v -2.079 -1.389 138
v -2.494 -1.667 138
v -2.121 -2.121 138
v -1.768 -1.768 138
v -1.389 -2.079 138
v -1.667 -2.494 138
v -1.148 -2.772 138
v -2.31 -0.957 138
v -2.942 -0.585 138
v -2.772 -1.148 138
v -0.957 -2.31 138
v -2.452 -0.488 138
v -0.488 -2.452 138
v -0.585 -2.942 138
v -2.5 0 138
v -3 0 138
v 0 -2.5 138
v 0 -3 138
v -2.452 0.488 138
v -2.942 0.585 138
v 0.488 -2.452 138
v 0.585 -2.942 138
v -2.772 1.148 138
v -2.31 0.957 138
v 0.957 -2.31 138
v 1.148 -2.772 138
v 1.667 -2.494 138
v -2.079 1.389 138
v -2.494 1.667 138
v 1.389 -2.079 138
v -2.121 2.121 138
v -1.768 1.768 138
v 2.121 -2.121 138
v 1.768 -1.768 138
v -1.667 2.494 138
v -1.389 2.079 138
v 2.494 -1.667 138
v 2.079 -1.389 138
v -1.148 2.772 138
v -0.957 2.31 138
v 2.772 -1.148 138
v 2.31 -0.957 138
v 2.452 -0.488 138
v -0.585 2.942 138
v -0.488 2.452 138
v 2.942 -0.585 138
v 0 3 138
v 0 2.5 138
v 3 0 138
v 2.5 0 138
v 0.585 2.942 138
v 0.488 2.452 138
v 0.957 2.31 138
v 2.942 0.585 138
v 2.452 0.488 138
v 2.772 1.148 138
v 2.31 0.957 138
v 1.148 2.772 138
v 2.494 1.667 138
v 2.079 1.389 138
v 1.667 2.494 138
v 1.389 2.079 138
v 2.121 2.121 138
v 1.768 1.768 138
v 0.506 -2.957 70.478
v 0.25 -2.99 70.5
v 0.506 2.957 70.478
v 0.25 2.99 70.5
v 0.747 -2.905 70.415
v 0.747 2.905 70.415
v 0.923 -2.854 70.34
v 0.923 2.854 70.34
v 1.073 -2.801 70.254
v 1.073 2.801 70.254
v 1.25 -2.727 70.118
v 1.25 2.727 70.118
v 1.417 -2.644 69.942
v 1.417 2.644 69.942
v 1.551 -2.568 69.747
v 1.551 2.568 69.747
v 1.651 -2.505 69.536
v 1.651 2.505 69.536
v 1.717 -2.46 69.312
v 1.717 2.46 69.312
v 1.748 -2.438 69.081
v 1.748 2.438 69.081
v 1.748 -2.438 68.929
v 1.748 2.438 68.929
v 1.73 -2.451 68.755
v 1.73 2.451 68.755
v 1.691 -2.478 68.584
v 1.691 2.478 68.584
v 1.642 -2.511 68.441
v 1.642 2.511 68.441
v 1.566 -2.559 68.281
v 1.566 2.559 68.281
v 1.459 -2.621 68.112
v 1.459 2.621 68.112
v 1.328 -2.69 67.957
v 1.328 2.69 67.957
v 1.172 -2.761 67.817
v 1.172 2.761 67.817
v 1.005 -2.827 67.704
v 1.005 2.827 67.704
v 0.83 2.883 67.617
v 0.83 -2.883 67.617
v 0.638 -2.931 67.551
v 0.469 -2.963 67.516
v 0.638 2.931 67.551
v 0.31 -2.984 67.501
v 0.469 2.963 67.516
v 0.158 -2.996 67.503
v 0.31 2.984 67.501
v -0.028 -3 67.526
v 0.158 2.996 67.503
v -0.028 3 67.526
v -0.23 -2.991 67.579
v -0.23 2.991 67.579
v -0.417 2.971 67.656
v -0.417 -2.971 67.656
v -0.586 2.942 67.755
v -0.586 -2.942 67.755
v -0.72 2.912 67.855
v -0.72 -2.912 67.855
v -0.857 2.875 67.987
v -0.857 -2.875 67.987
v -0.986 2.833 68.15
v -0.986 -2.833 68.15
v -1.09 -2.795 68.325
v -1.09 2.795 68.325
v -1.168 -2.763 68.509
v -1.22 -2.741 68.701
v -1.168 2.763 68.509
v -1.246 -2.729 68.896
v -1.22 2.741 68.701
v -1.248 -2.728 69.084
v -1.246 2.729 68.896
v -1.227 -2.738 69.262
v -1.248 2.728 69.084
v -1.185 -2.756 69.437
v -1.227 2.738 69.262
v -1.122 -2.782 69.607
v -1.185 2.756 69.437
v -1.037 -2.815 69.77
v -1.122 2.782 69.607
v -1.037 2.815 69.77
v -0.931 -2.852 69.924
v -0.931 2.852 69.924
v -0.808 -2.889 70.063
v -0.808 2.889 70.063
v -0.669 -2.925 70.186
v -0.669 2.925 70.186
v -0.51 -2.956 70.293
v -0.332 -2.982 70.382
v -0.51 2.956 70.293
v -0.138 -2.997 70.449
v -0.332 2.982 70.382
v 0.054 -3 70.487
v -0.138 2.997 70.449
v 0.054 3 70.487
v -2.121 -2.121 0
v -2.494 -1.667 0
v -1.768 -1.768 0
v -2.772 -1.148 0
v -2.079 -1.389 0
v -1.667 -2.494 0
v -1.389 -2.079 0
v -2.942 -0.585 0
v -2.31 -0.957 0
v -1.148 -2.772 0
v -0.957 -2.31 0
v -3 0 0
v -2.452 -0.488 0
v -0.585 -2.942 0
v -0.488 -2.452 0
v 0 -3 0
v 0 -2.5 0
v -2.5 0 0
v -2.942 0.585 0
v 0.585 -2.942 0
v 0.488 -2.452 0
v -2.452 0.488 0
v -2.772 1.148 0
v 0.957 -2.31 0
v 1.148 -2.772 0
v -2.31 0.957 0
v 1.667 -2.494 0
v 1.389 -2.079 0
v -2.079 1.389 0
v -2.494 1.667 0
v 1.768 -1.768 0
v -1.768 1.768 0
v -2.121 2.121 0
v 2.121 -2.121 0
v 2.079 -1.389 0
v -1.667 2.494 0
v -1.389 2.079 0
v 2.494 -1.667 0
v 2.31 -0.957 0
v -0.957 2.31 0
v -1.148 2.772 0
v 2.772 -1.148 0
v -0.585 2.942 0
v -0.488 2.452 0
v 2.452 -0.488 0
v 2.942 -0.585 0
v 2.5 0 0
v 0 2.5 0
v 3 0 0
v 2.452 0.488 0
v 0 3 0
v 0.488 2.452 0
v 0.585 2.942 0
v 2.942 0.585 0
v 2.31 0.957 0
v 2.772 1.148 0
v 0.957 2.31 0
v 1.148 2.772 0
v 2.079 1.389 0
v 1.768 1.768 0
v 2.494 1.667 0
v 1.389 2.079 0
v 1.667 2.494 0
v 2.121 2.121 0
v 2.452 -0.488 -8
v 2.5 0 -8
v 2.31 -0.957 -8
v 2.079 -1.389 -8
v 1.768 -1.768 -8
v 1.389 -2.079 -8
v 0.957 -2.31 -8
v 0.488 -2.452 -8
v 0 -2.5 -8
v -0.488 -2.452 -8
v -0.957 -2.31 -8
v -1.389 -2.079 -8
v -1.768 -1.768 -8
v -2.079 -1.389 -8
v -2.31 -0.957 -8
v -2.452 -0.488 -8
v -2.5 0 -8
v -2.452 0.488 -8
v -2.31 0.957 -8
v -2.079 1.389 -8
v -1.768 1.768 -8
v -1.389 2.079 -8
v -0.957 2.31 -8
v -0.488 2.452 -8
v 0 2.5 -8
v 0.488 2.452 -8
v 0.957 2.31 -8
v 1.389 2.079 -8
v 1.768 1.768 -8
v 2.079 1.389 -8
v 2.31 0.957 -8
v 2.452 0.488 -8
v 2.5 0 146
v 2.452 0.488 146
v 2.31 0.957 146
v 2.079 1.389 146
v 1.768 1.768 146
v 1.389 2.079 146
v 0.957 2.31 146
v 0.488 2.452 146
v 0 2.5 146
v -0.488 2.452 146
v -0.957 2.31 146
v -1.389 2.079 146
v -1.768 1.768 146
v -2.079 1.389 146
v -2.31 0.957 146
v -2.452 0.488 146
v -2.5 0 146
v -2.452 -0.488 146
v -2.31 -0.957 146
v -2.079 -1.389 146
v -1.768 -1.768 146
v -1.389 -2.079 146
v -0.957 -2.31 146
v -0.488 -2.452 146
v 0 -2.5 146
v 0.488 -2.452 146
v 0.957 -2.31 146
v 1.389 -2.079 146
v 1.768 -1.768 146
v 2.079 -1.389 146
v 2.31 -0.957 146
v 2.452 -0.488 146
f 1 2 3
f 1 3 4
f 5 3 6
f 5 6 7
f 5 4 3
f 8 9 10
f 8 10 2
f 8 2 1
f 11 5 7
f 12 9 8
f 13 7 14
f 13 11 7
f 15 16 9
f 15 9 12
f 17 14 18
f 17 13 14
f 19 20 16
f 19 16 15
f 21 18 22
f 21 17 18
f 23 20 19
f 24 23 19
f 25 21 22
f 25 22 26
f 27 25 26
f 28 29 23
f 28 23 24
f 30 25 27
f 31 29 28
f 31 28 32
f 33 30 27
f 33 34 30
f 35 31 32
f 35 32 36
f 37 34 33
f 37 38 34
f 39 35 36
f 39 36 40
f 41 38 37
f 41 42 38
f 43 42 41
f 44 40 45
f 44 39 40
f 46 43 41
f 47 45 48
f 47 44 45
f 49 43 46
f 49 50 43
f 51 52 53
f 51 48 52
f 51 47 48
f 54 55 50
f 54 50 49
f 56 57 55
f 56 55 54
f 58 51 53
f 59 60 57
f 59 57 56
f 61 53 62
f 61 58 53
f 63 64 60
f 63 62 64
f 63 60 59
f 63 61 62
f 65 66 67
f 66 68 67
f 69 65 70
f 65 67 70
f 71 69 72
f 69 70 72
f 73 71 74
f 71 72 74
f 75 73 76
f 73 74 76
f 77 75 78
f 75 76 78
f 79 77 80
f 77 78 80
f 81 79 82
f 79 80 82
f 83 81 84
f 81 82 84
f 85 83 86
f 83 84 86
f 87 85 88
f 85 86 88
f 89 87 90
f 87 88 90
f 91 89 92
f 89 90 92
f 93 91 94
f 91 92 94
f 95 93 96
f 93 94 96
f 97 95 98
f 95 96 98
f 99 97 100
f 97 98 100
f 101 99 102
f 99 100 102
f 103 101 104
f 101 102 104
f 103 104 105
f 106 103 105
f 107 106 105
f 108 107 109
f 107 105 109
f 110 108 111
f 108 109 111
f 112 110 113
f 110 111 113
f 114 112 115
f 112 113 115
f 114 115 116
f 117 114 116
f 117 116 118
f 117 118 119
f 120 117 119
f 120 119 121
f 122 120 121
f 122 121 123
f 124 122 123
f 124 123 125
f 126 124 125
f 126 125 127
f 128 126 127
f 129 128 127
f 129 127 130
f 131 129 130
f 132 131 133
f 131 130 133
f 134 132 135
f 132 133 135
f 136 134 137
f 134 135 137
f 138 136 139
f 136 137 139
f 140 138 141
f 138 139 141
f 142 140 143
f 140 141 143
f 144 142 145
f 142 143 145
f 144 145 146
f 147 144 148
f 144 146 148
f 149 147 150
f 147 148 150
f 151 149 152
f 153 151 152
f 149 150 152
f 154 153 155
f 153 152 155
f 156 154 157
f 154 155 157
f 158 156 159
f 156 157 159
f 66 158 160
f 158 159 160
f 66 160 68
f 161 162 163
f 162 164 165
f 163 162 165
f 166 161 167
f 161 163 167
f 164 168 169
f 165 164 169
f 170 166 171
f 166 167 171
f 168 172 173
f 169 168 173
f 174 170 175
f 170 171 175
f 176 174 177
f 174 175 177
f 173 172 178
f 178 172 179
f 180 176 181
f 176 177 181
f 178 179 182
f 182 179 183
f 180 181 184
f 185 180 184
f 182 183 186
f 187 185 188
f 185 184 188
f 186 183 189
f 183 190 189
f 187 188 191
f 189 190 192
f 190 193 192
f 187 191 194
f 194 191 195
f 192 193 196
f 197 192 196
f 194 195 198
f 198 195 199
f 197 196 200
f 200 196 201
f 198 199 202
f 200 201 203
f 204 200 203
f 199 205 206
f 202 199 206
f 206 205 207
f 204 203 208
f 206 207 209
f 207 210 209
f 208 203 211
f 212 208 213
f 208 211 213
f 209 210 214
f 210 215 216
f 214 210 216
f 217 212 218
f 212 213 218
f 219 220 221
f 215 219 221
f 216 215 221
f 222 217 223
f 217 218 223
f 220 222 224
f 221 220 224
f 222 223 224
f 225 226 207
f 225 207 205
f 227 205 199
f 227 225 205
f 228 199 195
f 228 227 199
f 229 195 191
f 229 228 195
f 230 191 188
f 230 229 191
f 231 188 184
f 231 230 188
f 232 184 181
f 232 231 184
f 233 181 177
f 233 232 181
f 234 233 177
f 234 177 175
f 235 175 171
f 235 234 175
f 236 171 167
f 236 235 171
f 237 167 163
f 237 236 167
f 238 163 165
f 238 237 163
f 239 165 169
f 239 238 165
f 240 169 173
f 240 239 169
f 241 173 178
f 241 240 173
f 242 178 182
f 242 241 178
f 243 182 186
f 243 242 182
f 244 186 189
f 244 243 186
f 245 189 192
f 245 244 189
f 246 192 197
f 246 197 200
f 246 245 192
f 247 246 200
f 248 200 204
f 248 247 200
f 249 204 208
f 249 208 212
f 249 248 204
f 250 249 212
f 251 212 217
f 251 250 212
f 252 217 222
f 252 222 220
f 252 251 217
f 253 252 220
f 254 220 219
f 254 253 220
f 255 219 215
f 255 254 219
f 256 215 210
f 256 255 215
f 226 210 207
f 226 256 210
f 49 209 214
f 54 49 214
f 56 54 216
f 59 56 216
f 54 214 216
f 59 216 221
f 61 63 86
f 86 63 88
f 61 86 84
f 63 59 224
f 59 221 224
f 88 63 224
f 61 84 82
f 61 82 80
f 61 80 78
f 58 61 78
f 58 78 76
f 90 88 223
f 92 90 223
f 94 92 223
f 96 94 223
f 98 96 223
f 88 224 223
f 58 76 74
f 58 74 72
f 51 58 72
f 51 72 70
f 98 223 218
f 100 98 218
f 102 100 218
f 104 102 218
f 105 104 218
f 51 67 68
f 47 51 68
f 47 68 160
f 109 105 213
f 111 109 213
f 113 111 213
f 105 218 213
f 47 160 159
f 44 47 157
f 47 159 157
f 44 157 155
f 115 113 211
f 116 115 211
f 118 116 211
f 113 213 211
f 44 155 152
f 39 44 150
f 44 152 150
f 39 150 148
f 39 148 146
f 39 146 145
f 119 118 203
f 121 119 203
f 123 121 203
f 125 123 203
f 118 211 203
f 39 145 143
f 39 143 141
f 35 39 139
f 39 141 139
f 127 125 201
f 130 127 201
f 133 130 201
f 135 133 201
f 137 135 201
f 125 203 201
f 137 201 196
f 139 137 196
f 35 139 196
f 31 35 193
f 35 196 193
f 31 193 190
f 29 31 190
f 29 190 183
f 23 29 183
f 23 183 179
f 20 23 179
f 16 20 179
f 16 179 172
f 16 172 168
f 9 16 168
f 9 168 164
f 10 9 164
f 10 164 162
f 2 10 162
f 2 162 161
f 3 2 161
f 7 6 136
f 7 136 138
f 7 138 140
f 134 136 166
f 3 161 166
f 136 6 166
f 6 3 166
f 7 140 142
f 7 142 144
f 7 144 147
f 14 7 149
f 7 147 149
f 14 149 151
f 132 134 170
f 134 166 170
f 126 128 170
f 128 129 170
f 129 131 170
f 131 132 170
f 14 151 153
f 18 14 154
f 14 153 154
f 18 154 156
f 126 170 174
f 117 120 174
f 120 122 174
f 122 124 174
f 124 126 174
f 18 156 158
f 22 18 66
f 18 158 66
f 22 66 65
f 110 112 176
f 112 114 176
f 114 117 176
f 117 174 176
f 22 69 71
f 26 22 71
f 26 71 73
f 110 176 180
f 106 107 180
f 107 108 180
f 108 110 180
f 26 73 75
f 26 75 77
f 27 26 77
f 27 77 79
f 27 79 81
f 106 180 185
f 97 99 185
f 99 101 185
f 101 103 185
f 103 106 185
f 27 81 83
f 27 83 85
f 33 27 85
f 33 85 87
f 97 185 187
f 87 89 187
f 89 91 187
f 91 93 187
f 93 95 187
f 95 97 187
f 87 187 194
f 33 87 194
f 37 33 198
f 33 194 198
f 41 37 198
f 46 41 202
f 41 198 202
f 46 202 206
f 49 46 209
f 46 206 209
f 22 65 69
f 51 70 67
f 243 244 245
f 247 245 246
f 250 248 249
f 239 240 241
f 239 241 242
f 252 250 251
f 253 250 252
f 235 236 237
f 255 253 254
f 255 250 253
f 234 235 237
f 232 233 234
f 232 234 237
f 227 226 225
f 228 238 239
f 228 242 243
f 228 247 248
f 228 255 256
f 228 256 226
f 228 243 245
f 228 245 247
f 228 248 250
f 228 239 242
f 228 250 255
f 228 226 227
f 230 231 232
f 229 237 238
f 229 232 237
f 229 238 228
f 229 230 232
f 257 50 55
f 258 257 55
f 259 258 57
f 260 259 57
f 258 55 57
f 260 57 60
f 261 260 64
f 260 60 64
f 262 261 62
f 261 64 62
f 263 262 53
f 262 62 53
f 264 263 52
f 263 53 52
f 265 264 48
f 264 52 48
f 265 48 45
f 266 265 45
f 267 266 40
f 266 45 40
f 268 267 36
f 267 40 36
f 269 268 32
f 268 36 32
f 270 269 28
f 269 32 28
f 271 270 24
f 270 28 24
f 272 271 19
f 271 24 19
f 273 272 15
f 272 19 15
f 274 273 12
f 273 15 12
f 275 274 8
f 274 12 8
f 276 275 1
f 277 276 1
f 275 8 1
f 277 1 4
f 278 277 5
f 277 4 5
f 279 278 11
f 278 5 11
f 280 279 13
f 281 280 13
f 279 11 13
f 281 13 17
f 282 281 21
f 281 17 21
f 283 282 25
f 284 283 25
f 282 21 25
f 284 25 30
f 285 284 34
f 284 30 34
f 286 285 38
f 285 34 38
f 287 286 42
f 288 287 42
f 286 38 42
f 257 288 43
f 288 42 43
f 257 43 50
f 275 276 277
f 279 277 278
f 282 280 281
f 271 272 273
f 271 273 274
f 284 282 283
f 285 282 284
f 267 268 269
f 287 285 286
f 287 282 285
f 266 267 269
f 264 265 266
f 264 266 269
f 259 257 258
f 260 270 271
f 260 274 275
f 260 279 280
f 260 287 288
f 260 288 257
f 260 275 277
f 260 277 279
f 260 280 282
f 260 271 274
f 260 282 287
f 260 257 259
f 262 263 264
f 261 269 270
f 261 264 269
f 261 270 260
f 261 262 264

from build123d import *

# Parameters (mm, degrees)
SKETCH1_R                           = 3
BOSS_EXTRUDE1_DEPTH                 = 138
SKETCH2_R                           = 2.5
BOSS_EXTRUDE2_DEPTH                 = 8
BOSS_EXTRUDE3_START                 = 8
SKETCH3_R                           = 2.5
BOSS_EXTRUDE3_DEPTH                 = 8
CUT_EXTRUDE1_REACH                  = 148.062
CUT_EXTRUDE1_END_RADIUS             = 3
SKETCH4_R                           = 1.5
CUT_EXTRUDE1_DIRECTION_2_REACH      = 148.062
CUT_EXTRUDE1_DIRECTION_2_END_RADIUS = 3


with BuildPart() as part:
    # Sketch1 → Boss-Extrude1 (new body)
    with BuildSketch(Plane.XY):
        Circle(SKETCH1_R)
    extrude(amount=BOSS_EXTRUDE1_DEPTH)

    # Sketch2 → Boss-Extrude2 (add)
    with BuildSketch(Plane.XY.offset(138)):
        Circle(SKETCH2_R)
    extrude(amount=BOSS_EXTRUDE2_DEPTH)

    # Sketch3 → Boss-Extrude3 (add)
    with BuildSketch(Plane(origin=(0, 0, 0), x_dir=(-1, 0, 0), z_dir=(0, 0, -1)).offset(BOSS_EXTRUDE3_START)):
        with Locations(Location((0, 0, 0), (0, 0, 180))):
            Circle(SKETCH3_R)
    extrude(amount=-BOSS_EXTRUDE3_DEPTH)

    # Cut-Extrude1: up to this cylinder (the profile starts inside it)
    cut_extrude1_end = Plane(origin=(0, 0, 69), z_dir=(0, 0, -1)) * Cylinder(CUT_EXTRUDE1_END_RADIUS, 303.124, mode=Mode.PRIVATE)
    # Sketch4 → Cut-Extrude1 (cut, up to the surface)
    with BuildSketch(Plane(origin=(0, 0, 0), x_dir=(1, 0, 0), z_dir=(0, 1, 0)), mode=Mode.PRIVATE) as cut_extrude1_sk1:
        with Locations(Location((0.25, -69, 0), (0, 0, 270))):
            Circle(SKETCH4_R)
    cut_extrude1_tool1 = extrude(cut_extrude1_sk1.sketch, amount=-CUT_EXTRUDE1_REACH, mode=Mode.PRIVATE) & cut_extrude1_end
    add(cut_extrude1_tool1.solids().sort_by_distance((0.25, 0, 69))[0], mode=Mode.SUBTRACT)

    # Cut-Extrude1 direction 2: up to this cylinder (the profile starts inside it)
    cut_extrude1_direction_2_end = Plane(origin=(0, 0, 69), z_dir=(0, 0, -1)) * Cylinder(CUT_EXTRUDE1_DIRECTION_2_END_RADIUS, 303.124, mode=Mode.PRIVATE)
    # Sketch4 → Cut-Extrude1 direction 2 (cut, up to the surface)
    with BuildSketch(Plane(origin=(0, 0, 0), x_dir=(1, 0, 0), z_dir=(0, 1, 0)), mode=Mode.PRIVATE) as cut_extrude1_direction_2_sk1:
        with Locations(Location((0.25, -69, 0), (0, 0, 270))):
            Circle(SKETCH4_R)
    cut_extrude1_direction_2_tool1 = extrude(cut_extrude1_direction_2_sk1.sketch, amount=CUT_EXTRUDE1_DIRECTION_2_REACH, mode=Mode.PRIVATE) & cut_extrude1_direction_2_end
    add(cut_extrude1_direction_2_tool1.solids().sort_by_distance((0.25, 0, 69))[0], mode=Mode.SUBTRACT)


solid = part.part
